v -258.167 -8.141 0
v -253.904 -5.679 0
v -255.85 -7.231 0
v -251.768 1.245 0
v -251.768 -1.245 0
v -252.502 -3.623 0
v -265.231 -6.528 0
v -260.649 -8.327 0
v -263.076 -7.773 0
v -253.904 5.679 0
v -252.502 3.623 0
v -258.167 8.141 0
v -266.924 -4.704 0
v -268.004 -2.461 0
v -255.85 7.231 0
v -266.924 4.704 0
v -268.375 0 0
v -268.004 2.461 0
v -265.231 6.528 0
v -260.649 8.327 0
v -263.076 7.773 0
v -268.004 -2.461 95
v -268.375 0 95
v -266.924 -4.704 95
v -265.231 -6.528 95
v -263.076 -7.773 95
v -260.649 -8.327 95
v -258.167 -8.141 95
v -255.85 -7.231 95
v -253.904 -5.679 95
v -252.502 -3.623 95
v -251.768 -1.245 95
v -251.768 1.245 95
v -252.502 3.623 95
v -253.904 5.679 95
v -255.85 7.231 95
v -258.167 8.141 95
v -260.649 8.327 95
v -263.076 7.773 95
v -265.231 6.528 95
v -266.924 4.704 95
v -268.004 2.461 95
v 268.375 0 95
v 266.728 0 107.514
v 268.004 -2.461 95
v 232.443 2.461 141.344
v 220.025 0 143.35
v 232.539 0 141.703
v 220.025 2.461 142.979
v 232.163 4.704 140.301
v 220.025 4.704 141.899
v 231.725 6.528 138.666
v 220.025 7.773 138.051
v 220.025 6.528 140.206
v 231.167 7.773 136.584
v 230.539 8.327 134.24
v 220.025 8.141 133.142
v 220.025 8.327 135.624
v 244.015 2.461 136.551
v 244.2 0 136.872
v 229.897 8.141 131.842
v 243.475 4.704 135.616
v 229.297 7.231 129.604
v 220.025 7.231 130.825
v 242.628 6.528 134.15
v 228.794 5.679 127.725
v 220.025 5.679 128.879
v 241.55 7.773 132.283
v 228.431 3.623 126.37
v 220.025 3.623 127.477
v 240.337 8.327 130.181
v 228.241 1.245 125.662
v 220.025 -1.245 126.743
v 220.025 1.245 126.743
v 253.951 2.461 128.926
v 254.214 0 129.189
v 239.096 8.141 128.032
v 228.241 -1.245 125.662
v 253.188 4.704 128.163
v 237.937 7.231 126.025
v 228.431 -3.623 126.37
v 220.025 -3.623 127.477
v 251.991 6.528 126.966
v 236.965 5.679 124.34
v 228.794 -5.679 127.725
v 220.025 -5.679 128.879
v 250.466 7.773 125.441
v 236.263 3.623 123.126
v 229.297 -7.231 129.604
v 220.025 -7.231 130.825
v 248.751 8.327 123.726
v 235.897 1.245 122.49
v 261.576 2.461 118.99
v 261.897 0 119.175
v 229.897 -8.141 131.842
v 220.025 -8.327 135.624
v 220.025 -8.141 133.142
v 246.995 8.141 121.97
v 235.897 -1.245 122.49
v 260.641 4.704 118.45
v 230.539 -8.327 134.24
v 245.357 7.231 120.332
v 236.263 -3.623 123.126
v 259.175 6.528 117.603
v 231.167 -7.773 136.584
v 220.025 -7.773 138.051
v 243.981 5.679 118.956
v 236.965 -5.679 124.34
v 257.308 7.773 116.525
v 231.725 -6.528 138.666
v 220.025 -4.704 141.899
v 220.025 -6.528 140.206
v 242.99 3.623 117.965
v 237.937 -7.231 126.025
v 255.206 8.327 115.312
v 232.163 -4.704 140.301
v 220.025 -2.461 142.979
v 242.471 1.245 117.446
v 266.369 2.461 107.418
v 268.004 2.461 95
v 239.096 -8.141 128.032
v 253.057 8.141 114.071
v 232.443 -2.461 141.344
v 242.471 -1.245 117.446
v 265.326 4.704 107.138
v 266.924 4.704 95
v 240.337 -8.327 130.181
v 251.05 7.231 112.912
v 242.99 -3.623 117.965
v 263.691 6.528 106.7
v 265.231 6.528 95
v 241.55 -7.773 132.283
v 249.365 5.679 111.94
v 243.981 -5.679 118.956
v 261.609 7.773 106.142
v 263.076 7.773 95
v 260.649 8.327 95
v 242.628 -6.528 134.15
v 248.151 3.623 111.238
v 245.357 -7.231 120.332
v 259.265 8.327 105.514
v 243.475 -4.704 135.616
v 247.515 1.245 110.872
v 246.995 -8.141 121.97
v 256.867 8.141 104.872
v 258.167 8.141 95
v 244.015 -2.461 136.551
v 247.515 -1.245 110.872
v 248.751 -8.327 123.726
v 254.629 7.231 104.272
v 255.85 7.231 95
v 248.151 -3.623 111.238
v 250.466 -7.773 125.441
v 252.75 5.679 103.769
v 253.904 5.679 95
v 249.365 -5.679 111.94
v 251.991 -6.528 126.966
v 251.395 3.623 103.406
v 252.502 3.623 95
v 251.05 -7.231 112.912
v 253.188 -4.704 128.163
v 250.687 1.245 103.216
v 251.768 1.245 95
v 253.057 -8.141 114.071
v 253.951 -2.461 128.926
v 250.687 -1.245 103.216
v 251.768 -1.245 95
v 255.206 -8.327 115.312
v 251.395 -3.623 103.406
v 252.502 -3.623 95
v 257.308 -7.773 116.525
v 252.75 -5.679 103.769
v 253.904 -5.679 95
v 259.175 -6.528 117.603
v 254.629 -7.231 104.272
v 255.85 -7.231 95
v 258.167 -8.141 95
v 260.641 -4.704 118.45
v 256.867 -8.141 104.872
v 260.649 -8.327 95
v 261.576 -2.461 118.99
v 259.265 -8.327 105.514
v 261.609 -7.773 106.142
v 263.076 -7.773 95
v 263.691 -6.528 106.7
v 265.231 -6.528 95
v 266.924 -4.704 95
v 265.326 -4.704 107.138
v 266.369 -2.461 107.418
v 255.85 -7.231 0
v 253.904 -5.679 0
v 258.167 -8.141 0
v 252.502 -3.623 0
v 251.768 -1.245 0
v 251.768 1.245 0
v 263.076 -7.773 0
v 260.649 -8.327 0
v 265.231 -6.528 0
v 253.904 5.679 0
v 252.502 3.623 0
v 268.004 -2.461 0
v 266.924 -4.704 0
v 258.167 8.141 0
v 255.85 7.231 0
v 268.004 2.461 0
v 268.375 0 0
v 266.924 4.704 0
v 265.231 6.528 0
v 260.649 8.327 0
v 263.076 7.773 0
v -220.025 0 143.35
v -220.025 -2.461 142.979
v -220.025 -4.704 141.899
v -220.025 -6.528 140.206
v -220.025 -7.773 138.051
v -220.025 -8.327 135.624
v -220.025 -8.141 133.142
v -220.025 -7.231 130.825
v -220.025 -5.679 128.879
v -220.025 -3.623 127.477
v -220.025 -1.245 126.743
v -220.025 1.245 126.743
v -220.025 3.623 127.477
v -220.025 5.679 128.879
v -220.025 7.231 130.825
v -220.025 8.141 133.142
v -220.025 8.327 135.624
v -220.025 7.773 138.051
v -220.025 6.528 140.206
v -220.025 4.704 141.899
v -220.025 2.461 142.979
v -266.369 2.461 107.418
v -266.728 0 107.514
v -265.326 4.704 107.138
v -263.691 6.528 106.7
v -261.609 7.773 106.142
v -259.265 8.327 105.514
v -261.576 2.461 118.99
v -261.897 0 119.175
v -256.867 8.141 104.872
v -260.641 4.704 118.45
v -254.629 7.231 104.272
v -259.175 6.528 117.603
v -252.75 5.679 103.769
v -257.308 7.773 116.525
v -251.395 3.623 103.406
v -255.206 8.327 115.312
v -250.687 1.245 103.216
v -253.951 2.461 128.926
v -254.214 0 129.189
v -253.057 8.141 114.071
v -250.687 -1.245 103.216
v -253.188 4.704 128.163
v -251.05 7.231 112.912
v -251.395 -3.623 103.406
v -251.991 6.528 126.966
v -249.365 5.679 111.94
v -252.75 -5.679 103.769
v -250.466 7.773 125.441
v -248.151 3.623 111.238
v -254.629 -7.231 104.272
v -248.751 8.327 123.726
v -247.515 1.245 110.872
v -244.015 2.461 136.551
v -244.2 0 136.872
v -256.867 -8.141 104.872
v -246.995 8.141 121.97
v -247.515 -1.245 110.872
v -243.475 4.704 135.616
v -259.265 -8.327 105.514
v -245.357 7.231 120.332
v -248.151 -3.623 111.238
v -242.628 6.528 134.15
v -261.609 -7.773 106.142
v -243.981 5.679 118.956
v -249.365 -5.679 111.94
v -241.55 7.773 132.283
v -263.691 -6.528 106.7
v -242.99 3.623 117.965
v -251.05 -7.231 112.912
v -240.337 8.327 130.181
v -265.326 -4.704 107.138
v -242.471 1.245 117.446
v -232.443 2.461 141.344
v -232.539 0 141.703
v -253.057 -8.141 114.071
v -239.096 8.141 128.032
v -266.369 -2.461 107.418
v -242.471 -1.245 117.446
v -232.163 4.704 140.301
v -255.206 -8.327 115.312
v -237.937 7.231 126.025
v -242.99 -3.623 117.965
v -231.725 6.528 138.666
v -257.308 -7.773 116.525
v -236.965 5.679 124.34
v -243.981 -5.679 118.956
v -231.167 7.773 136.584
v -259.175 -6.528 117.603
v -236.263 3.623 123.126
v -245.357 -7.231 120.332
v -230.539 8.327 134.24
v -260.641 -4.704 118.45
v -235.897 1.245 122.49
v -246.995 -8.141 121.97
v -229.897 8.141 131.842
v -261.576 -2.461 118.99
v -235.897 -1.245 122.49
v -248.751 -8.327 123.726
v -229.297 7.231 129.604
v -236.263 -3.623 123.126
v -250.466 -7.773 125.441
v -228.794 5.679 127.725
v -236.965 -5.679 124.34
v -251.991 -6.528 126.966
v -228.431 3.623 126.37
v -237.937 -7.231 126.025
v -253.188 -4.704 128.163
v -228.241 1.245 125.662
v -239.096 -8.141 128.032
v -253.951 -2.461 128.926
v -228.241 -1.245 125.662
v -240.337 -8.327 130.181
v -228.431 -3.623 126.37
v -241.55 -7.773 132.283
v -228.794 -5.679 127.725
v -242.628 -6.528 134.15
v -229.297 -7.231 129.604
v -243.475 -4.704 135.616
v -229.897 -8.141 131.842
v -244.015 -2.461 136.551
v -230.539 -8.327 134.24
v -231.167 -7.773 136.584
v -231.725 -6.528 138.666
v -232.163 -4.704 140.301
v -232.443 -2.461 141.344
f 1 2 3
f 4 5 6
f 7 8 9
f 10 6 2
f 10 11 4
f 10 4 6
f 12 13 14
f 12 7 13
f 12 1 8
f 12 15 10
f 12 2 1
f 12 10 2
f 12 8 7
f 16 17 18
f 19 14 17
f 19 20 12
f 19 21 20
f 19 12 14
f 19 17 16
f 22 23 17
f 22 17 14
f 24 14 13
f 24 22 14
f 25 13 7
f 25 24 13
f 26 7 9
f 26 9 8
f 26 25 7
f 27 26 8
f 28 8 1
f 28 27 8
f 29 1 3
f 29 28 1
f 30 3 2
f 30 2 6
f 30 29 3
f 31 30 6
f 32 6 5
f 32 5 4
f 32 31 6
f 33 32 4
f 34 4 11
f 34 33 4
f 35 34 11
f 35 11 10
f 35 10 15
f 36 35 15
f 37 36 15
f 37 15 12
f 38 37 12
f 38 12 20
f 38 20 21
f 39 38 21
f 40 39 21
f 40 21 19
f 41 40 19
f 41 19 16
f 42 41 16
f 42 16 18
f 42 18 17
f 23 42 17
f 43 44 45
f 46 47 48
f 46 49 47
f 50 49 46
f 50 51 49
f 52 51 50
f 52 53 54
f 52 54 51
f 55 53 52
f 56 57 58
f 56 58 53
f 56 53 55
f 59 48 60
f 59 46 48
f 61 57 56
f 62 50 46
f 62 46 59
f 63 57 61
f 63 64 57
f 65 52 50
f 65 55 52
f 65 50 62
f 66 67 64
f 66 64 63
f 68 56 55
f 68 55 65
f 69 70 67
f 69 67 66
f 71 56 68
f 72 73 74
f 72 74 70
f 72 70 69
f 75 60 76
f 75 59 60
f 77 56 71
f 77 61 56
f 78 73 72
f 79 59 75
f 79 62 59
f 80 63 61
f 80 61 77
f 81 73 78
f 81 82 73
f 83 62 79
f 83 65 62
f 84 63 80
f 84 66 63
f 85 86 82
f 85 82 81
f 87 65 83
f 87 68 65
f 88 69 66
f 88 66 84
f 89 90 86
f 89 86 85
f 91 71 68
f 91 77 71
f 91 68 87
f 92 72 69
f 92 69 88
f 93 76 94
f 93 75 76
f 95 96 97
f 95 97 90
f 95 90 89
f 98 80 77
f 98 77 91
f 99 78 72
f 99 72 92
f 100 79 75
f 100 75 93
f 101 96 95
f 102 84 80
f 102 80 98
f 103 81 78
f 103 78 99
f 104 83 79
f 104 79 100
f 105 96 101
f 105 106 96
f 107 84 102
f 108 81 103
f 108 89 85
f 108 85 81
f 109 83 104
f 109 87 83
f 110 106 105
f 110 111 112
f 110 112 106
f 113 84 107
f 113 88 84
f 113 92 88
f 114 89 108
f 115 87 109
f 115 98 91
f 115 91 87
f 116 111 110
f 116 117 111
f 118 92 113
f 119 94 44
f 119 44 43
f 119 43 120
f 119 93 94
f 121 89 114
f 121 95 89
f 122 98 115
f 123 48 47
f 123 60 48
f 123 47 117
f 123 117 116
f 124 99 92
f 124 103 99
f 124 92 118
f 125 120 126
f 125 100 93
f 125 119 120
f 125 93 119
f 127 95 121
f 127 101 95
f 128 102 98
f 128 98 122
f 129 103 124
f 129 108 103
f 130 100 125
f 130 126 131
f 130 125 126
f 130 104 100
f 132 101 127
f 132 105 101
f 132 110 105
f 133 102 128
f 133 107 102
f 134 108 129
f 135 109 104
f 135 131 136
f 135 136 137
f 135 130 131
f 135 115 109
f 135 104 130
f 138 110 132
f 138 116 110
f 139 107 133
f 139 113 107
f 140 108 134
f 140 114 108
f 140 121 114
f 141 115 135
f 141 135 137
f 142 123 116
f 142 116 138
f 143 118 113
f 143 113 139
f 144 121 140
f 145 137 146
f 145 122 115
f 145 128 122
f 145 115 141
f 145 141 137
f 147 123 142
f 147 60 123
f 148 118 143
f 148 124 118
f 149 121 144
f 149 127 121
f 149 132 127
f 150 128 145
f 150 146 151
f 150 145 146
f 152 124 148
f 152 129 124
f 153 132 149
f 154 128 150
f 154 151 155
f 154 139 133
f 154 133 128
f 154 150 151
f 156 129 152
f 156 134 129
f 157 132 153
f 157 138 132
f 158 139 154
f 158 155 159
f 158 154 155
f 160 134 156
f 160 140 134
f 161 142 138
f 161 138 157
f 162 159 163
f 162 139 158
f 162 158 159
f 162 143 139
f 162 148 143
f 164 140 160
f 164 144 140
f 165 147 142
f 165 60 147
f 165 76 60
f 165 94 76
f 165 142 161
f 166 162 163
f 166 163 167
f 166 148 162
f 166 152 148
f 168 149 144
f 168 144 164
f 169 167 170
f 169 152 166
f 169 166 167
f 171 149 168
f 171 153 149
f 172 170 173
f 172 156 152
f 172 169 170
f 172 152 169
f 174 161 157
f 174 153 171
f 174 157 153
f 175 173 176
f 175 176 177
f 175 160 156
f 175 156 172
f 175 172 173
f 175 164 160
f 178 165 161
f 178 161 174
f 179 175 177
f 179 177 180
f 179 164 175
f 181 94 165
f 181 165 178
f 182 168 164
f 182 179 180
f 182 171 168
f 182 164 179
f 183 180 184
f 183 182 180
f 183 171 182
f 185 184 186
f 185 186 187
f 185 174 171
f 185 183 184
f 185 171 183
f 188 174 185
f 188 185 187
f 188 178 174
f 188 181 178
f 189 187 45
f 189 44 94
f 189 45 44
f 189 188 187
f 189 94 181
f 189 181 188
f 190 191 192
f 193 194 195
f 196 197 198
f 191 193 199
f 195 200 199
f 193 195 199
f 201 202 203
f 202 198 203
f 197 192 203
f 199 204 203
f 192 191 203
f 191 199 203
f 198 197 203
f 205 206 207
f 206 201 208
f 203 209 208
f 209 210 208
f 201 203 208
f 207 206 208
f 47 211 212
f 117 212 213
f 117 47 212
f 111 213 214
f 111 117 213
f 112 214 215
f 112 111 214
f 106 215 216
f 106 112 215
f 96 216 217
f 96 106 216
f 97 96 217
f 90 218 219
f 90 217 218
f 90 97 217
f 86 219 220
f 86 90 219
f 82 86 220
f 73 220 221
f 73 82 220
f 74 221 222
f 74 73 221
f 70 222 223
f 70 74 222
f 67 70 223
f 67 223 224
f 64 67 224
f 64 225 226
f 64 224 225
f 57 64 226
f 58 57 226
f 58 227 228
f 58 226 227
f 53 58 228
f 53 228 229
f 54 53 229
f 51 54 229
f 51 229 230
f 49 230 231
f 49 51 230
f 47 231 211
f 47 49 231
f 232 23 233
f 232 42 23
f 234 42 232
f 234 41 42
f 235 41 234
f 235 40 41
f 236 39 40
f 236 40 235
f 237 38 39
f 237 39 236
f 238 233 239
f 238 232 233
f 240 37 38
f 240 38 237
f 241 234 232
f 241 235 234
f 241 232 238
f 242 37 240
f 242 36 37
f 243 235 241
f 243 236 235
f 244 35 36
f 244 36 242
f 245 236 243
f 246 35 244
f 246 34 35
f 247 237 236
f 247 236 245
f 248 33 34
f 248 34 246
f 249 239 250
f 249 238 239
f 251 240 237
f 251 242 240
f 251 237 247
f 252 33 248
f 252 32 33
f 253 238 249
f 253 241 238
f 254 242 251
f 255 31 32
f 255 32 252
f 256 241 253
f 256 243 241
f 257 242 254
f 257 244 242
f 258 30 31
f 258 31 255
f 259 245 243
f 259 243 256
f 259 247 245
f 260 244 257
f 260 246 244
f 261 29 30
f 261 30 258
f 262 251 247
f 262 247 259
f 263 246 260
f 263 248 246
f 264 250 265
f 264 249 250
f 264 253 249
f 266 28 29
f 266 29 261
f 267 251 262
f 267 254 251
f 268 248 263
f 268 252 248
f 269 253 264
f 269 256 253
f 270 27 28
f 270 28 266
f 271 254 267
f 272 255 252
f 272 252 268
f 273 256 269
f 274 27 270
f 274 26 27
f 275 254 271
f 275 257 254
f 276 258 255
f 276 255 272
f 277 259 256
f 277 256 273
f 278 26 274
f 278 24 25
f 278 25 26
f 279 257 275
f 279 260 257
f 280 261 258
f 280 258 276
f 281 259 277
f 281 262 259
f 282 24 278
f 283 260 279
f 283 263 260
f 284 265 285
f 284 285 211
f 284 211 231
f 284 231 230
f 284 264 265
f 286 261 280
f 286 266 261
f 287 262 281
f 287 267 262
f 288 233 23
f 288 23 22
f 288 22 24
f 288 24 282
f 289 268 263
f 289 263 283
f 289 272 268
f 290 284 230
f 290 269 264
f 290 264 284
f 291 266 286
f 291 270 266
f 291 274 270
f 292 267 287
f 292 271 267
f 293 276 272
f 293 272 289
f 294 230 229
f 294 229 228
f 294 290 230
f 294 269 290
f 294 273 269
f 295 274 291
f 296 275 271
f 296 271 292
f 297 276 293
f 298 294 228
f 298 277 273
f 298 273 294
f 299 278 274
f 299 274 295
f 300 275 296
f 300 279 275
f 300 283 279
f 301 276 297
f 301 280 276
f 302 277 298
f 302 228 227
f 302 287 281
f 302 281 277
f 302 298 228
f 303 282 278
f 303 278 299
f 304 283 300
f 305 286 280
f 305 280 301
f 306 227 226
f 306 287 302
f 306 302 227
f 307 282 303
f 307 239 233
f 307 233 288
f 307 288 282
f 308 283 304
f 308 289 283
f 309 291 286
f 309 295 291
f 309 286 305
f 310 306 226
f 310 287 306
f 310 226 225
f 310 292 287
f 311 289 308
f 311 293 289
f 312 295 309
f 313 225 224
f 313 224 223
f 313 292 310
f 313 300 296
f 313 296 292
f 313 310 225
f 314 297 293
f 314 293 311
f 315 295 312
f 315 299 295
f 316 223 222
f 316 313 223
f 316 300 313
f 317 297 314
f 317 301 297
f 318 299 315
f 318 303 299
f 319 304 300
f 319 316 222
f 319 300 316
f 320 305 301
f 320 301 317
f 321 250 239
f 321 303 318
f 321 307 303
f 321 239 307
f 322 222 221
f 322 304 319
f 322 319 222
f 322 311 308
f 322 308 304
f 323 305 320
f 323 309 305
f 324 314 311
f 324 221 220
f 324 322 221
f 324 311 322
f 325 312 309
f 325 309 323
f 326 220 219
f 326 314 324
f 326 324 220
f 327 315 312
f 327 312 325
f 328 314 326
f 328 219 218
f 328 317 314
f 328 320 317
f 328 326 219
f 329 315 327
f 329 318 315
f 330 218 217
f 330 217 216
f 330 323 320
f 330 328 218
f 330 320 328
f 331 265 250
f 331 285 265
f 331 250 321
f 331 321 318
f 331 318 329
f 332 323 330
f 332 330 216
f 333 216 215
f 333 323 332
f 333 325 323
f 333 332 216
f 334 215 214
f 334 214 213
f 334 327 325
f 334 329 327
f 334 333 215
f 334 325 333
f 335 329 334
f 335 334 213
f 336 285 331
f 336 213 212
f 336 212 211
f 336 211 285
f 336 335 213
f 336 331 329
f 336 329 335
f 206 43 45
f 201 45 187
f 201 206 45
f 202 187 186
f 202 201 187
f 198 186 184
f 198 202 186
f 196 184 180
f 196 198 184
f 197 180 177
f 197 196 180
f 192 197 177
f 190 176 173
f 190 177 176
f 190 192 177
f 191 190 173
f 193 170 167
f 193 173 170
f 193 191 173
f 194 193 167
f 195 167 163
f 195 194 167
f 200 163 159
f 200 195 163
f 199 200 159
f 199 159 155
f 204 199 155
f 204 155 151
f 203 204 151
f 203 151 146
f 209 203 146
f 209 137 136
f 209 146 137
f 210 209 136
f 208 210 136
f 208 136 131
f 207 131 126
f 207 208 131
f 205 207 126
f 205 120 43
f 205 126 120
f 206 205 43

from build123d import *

# Parameters (mm, degrees)
SKETCH2_R = 8.35


with BuildPart() as part:
    # Sweep1: sweep along a path in Sketch1
    with BuildLine(Plane(origin=(0, 0, 0), x_dir=(1, 0, 0), z_dir=(0, 1, 0))) as sweep1_path:
        Line((-260.025, 0), (-260.025, -95))
        ThreePointArc((-260.025, -95), (-248.309271247, -123.284271247), (-220.025, -135))
        Line((-220.025, -135), (220.025, -135))
        ThreePointArc((220.025, -135), (248.309271247, -123.284271247), (260.025, -95))
        Line((260.025, -95), (260.025, 0))
    # Sketch2 → Sweep1 (sweep)
    with BuildSketch(Plane.XY):
        with Locations((260.025, 0)):
            Circle(SKETCH2_R)
    sweep(path=sweep1_path.line)


solid = part.part
